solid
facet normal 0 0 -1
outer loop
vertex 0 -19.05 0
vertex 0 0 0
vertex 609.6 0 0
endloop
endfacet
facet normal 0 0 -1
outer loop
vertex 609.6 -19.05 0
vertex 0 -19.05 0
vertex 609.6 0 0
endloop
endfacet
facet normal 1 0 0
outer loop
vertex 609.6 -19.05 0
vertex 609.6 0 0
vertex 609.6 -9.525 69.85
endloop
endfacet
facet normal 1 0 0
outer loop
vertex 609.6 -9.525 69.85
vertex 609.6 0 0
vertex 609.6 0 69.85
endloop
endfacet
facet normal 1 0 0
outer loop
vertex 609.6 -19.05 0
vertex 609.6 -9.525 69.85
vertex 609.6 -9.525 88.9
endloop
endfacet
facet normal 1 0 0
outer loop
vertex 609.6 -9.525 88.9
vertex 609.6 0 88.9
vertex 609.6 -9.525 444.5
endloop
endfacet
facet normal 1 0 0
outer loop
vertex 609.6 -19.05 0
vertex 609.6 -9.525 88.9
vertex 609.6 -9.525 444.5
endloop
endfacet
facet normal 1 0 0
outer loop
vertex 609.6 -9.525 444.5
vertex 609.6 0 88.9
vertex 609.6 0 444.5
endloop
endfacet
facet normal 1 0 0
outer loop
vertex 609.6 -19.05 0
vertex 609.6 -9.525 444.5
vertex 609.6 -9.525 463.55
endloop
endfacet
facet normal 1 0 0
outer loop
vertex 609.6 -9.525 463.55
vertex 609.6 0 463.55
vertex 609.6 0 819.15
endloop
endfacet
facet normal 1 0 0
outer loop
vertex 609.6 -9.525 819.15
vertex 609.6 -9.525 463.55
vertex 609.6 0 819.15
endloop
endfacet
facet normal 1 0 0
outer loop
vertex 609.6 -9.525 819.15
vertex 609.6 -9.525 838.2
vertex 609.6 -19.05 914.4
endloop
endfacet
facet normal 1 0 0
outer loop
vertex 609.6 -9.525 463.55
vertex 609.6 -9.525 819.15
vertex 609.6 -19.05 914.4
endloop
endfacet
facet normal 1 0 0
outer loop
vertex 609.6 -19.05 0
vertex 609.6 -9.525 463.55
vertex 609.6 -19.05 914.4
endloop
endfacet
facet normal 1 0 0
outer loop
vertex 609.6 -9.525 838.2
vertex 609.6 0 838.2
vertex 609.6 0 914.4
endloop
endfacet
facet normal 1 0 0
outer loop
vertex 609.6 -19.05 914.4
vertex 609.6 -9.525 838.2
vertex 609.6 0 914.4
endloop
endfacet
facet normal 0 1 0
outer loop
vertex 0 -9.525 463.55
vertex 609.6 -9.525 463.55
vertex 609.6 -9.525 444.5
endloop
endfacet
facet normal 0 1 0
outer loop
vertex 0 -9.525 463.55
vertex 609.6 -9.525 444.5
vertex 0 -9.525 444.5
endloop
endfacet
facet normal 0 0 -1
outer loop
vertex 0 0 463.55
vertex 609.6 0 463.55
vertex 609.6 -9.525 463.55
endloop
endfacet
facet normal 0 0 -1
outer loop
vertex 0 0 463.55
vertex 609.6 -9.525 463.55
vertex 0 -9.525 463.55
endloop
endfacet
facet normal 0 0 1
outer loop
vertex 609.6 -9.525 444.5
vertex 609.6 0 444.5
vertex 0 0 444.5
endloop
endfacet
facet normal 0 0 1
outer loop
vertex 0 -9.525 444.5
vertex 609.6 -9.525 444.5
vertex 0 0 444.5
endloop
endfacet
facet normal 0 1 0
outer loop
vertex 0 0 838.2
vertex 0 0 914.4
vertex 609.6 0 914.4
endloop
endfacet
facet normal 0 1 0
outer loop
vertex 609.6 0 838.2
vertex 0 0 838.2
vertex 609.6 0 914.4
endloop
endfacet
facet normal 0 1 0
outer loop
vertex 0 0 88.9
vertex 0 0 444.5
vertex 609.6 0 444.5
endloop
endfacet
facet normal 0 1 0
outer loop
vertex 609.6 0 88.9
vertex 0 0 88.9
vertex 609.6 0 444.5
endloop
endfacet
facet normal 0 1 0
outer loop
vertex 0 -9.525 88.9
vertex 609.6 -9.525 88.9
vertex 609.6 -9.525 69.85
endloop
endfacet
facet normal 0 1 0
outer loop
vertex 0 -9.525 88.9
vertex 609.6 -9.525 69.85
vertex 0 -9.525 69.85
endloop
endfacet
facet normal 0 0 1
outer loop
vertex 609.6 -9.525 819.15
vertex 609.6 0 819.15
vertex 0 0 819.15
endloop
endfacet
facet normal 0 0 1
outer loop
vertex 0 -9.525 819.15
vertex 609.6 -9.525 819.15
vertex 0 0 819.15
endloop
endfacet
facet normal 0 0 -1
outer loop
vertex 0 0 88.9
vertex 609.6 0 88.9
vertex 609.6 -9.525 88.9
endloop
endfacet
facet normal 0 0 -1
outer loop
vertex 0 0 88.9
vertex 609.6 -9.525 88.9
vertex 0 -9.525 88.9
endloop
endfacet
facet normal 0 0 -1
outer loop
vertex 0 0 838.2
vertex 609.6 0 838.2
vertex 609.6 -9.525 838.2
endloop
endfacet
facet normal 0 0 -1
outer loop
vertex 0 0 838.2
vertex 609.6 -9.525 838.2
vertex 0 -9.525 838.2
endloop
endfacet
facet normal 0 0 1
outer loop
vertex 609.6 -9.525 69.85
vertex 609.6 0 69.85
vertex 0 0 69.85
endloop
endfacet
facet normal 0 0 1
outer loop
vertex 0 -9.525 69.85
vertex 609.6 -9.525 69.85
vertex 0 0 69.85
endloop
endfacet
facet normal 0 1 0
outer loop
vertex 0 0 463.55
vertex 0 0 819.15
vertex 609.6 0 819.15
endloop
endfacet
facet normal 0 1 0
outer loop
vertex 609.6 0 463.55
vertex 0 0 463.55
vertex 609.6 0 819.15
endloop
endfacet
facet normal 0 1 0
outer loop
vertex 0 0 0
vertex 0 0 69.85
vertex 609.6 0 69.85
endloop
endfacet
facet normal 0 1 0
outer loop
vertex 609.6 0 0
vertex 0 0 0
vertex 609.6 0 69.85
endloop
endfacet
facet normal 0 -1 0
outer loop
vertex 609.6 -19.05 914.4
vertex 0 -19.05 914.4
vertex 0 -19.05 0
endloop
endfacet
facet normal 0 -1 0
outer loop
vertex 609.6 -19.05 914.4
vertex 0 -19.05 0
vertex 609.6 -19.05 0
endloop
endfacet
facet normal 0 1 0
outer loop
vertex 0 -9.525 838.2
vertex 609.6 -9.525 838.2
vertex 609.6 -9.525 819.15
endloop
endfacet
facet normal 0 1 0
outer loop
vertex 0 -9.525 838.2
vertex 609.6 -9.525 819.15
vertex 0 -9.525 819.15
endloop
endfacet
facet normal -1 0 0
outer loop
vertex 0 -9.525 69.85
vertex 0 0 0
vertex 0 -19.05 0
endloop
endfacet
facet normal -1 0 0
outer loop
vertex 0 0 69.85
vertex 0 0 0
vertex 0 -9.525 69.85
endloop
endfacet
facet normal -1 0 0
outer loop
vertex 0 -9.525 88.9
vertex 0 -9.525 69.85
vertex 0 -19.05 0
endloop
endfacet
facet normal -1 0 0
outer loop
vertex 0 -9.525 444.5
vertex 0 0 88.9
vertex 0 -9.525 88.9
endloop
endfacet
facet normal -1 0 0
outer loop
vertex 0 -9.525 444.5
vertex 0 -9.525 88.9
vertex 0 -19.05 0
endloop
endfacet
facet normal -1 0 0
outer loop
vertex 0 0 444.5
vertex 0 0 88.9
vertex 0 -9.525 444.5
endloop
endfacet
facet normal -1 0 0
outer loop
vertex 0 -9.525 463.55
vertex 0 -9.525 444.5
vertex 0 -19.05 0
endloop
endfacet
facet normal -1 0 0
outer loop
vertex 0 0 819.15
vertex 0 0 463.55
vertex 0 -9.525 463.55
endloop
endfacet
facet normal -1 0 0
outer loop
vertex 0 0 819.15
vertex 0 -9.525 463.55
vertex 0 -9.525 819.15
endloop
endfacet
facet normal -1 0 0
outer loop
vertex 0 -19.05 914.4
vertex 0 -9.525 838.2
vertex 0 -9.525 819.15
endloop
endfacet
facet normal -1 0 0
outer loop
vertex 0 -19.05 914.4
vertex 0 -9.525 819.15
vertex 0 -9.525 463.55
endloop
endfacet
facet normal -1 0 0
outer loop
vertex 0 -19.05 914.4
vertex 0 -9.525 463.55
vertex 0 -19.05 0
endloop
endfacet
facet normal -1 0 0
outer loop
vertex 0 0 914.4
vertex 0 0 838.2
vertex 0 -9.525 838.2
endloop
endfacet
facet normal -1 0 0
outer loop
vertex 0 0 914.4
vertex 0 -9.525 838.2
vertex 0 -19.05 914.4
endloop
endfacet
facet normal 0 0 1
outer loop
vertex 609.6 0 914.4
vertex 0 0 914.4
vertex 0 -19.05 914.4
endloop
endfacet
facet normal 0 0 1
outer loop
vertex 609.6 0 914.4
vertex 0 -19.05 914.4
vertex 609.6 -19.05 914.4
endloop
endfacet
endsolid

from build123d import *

# Parameters (mm, degrees)
F0_W     = 609.6
F0_H     = 914.4
F1_DEPTH = 19.05
F2_W     = 609.6
F2_H     = 19.05
F3_DEPTH = 9.525


# Not quite as in the source:
# - a length typed as a fraction of an inch, garbled in the dataset ("3 / 203.2 mm" for 3/8 in), is restored


with BuildPart() as f1:
    # F0 (on Front) → F1 (new body)
    with BuildSketch(Plane.XZ):
        with Locations((304.8, 457.2)):
            Rectangle(F0_W, F0_H)
    extrude(amount=F1_DEPTH)

    # F2 (on face) → F3 (cut)
    with BuildSketch(Plane(origin=(0, 0, 0), x_dir=(-1, 0, 0), z_dir=(0, 1, 0))):
        with Locations((-304.8, 79.375)):
            Rectangle(F2_W, F2_H)
        with Locations((-304.8, 454.025)):
            Rectangle(F2_W, F2_H)
        with Locations((-304.8, 828.675)):
            Rectangle(F2_W, F2_H)
    extrude(amount=-F3_DEPTH, mode=Mode.SUBTRACT)


solid = f1.part
